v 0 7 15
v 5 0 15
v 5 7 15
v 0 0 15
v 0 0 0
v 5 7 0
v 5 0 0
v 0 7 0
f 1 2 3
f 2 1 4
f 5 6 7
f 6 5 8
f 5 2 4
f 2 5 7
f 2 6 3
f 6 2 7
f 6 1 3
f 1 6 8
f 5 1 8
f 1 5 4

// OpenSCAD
// Generated by SolidPython 1.0.1 on 2020-07-29 00:46:54


cube(size = [5, 7, 15]);
/***********************************************
*********      SolidPython code:      **********
************************************************
 
# import packages: SolidPython
from solid import *
from solid.utils import *
from itertools import chain, combinations, permutations


class Resize:

    def __init__(self, scad_file):
        self.scad_file = scad_file
        #self.scad_file = import_scad(scad_file)
        # cone/cylinder param:
        self.r1 = 0
        self.r2 = 0
        self.h = 0
        # rectangular prism param:
        self.w = 0
        self.l = 0
        # ellipse param:
        self.r = 0

    # import OpenScad code (file name corresponds to shape)


    # classify shape + parameters
    def assign(self, param1, param2, param3):
        if self.scad_file == 'cone.scad':
            self.r1 = param1
            self.r2 = param2
            self.h = param3
        elif self.scad_file == 'cylinder.scad':
            self.r1 = param1
            self.r2 = param2
            self.h = param3
        elif self.scad_file == 'rectangularPrism.scad':
            self.h = param1
            self.l = param2
            self.w = param3
        else:
            self.r = param1
            self.h = param2

    # resize parameters
    def iterate(self):
        x = range(3, 20, 2)
        i = 1
        if self.scad_file == 'cone.scad':
            tempList = list(permutations(x, 2))
            for temp in tempList:
                param1 = temp[0]
                param2 = temp[1]
                filepath = 'produced_scad_files/' + 'cone' + str(param1) + '_' + str(param2) + '_' + '.scad'
                scad_render_to_file(cylinder(h=param1, r1=param2, r2=0), filepath)

        elif self.scad_file == 'cylinder.scad':
            tempList = list(permutations(x, 3))
            for temp in tempList:
                param1 = temp[0]
                param2 = temp[1]
                filepath = 'produced_scad_files/' + 'cylinder' + str(param1) + '_' + str(param2) + '_' + '.scad'
                scad_render_to_file(cylinder(h=param1, r1=param2, r2=param2), filepath)

        elif self.scad_file == 'rectangularPrism.scad':
            tempList = list(permutations(x, 3))
            for temp in tempList:
                param1 = temp[0]
                param2 = temp[1]
                param3 = temp[2]
                filepath = 'produced_scad_files/' + 'rectangularPrism' + str(param1) + '_' + str(param2) + '_' + str(
                    param3) + '.scad'
                scad_render_to_file(cube(size=(param1, param2, param3)), filepath)

        elif self.scad_file == 'ellipse.scad':
            tempList = list(permutations(x, 4))
            for temp in tempList:
                param1 = temp[0]
                param2 = temp[1]
                param3 = temp[2]
                param4 = temp[3]
                filepath = 'produced_scad_files/' + 'ellipse' + str(param1) + '_' + str(param2) + '_' + str(param3) + '_' + str(param4) + '.scad'
                scad_render_to_file(scale([param1, param2, param3])(sphere(r=param4)), filepath)

    def render_to_scadfile(self):
        scad_render_to_file(scad, 'example.scad') 
 
************************************************/
